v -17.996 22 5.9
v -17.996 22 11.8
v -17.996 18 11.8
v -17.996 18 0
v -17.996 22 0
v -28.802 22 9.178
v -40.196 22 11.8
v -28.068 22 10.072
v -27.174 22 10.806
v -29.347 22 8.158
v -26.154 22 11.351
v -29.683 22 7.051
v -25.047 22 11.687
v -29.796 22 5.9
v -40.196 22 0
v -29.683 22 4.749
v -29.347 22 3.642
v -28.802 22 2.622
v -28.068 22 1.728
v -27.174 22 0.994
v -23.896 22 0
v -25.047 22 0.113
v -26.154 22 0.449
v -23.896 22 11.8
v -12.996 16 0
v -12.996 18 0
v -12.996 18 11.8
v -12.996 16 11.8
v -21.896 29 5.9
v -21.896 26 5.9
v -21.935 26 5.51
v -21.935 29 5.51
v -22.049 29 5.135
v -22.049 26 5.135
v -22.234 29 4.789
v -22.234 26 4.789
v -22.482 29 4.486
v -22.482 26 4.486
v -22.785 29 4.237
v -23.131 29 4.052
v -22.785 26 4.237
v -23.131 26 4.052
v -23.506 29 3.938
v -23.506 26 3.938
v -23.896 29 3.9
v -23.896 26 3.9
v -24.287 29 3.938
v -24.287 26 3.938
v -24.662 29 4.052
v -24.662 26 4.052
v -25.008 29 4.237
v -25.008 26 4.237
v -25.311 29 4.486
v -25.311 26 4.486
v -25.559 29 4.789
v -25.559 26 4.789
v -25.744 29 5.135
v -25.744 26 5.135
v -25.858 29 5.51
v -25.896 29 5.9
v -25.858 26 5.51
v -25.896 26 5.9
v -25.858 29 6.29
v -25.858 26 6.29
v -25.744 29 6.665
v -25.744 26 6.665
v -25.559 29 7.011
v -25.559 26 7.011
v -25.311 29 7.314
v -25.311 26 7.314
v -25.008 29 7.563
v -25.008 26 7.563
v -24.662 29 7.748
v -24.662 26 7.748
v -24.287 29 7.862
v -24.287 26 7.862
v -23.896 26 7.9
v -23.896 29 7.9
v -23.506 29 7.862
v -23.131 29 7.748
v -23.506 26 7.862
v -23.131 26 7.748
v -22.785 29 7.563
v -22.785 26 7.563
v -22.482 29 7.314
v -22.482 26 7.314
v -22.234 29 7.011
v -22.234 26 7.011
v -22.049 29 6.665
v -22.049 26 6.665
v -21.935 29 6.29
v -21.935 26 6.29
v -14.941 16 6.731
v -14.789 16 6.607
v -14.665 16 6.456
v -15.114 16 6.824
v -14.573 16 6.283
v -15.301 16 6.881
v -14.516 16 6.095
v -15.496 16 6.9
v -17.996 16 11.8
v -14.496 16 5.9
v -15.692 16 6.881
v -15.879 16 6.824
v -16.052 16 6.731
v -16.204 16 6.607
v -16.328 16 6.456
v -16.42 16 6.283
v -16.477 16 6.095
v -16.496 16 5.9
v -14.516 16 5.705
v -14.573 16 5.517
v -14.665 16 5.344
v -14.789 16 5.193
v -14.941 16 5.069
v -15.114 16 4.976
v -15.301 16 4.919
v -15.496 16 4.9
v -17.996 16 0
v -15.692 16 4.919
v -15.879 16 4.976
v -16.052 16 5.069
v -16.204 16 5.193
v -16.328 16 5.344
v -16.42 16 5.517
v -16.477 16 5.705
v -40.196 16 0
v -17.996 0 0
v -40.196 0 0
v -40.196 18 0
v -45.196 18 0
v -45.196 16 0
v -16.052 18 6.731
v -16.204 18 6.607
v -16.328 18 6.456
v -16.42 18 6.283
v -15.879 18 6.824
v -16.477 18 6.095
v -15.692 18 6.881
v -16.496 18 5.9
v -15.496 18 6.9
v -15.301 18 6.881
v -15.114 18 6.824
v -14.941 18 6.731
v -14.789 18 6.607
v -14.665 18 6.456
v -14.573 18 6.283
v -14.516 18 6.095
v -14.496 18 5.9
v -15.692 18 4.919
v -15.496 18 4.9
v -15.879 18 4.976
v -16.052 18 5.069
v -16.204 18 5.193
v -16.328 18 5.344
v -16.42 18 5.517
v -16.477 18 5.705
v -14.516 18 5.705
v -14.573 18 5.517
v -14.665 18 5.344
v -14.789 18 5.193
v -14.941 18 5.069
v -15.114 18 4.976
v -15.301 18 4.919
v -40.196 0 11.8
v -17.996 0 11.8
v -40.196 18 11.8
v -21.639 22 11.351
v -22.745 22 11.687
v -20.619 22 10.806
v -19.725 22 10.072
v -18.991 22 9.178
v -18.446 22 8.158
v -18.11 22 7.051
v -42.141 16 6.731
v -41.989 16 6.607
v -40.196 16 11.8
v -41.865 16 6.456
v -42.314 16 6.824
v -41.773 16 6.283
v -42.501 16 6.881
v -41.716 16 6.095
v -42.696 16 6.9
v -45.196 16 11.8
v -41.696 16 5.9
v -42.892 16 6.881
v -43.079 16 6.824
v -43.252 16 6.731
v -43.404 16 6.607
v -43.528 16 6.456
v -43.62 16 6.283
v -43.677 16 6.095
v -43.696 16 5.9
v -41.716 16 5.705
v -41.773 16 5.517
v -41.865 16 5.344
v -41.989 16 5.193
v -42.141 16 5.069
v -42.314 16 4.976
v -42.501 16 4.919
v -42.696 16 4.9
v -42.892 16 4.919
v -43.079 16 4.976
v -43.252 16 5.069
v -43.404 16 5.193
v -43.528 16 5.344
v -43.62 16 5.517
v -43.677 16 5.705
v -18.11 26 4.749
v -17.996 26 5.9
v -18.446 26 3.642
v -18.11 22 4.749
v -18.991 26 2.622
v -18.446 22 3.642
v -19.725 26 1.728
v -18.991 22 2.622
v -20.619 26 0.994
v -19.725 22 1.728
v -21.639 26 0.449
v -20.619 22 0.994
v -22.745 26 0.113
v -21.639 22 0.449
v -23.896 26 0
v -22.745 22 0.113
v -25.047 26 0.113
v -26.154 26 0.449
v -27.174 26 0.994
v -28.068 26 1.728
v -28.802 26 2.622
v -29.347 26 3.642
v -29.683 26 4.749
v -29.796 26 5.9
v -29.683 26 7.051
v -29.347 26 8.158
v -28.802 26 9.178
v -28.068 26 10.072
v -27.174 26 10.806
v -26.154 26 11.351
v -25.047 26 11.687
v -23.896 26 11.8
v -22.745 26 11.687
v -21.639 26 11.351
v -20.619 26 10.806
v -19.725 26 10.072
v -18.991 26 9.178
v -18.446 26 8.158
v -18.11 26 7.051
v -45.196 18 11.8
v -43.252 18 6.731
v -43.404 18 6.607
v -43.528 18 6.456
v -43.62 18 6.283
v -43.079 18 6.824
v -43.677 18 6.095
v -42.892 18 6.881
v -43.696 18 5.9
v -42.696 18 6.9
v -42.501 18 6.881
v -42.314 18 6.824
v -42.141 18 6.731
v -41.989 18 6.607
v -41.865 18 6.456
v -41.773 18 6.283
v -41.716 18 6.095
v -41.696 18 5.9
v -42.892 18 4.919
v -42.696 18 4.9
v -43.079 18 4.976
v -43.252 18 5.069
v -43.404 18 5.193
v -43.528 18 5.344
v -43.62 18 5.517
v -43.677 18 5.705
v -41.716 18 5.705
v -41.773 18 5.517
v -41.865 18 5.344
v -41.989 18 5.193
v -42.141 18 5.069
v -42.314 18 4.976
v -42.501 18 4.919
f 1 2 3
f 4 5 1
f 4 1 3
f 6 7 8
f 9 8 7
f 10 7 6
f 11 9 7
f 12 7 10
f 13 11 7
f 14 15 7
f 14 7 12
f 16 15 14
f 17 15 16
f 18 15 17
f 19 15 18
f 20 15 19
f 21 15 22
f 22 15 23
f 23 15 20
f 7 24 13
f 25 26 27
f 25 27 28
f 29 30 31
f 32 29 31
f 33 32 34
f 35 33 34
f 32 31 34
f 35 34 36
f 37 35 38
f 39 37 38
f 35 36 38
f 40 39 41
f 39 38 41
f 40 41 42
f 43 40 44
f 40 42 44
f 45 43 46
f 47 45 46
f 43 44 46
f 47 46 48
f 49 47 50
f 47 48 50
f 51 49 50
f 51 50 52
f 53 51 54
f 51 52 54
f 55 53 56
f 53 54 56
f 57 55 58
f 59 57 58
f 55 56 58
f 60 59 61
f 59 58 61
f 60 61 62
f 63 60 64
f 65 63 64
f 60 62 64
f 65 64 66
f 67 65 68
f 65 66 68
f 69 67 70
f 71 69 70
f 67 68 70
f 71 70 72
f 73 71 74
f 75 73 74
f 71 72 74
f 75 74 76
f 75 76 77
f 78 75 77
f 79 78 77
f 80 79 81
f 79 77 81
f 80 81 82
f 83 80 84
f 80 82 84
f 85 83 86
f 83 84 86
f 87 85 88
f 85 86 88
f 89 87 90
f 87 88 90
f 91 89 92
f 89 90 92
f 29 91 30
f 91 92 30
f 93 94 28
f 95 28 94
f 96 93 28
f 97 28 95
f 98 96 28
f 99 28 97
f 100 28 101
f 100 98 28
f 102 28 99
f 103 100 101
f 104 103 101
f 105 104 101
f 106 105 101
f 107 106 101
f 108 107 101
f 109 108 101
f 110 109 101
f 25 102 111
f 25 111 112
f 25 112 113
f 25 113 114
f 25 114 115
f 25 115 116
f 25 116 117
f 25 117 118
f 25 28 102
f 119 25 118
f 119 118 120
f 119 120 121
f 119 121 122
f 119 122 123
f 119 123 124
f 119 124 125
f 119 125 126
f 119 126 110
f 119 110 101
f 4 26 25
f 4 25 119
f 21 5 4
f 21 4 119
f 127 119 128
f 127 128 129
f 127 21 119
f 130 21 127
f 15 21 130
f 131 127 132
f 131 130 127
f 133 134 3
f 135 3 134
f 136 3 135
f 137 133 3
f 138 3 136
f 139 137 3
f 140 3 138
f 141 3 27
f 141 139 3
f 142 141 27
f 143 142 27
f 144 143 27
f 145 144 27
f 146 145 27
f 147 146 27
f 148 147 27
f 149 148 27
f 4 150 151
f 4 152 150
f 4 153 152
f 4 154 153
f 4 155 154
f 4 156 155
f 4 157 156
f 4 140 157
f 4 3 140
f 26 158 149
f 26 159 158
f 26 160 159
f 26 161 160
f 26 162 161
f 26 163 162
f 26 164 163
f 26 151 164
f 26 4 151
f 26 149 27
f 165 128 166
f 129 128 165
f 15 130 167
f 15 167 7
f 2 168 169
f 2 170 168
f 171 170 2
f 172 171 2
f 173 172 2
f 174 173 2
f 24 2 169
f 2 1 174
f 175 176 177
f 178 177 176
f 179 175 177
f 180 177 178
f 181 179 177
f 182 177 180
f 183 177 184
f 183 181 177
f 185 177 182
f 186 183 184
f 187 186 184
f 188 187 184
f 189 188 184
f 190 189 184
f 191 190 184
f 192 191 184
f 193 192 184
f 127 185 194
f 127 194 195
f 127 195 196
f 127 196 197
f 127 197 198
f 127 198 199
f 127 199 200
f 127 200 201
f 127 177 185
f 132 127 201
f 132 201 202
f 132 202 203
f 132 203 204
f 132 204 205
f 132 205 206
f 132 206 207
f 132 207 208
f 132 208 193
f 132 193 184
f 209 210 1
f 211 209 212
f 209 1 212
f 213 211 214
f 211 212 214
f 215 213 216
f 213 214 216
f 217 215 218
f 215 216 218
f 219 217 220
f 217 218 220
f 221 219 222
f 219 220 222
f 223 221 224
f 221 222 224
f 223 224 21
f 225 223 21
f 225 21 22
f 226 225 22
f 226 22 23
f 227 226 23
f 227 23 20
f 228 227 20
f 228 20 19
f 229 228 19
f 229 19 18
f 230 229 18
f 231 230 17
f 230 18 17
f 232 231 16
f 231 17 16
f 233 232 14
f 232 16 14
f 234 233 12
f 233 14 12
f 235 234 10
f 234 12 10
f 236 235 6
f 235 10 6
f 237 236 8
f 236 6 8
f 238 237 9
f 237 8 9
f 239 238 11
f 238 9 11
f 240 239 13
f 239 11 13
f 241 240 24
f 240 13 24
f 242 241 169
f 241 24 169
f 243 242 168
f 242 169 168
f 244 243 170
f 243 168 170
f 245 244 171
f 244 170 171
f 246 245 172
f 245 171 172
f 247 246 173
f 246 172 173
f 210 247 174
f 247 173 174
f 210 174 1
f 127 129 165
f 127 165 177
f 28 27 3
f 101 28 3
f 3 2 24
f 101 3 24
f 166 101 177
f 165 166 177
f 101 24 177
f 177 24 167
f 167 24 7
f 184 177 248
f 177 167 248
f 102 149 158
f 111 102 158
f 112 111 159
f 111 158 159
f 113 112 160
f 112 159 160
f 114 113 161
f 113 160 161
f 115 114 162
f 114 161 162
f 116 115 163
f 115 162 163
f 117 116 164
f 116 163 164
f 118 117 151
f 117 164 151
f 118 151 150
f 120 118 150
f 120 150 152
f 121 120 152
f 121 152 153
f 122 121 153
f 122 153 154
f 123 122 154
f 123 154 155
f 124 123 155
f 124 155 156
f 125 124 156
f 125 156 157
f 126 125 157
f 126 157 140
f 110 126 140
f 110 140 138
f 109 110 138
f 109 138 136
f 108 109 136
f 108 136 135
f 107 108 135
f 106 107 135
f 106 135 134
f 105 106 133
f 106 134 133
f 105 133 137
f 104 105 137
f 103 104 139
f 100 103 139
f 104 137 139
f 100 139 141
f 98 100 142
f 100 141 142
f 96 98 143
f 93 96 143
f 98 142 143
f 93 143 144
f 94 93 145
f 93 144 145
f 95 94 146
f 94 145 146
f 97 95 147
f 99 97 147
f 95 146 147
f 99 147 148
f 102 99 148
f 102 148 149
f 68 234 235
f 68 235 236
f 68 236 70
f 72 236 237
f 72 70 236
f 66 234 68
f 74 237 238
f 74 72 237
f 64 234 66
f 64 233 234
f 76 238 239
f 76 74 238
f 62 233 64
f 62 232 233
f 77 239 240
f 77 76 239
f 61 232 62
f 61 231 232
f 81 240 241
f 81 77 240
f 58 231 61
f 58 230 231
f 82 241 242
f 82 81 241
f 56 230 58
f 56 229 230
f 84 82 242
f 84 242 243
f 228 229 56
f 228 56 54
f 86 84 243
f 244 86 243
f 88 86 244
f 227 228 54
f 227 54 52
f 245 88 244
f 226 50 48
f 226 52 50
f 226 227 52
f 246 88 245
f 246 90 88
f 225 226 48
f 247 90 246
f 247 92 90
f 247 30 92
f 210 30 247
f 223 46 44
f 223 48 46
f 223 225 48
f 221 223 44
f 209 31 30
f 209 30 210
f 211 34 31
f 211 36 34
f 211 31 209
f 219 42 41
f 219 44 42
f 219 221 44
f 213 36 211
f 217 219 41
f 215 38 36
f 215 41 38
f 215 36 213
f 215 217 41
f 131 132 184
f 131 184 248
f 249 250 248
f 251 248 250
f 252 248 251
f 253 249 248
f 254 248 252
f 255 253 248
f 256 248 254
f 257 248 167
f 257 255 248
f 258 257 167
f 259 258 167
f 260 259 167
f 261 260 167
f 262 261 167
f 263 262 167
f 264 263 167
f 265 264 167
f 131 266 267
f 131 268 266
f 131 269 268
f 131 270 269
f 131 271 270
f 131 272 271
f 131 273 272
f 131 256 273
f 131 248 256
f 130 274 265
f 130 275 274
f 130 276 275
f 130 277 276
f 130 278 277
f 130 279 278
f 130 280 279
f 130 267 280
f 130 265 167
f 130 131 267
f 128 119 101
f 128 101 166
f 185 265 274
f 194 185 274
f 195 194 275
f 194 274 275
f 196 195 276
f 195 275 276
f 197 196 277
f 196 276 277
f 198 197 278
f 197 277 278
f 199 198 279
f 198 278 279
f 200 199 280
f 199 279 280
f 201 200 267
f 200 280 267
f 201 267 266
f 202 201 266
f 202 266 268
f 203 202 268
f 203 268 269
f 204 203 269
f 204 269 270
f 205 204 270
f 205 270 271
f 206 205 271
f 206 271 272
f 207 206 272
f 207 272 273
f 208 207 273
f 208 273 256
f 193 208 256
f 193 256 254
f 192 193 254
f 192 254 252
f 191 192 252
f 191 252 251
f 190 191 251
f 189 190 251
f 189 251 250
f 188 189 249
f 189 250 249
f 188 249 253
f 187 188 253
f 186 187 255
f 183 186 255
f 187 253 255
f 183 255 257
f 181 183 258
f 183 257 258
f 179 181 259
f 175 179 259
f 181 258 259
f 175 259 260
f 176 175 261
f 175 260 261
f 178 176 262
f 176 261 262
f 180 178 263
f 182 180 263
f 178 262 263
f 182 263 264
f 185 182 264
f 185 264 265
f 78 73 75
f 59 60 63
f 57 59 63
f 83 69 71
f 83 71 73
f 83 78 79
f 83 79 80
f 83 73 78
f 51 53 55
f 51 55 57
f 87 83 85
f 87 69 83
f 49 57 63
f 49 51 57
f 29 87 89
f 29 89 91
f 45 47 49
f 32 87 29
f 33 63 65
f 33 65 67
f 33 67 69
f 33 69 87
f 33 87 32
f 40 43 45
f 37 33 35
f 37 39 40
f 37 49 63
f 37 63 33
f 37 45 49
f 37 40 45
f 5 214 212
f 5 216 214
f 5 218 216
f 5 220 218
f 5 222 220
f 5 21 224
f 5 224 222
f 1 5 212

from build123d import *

# Parameters (mm, degrees)
BOSS_EXTRU_1_DEPTH      = 11.8
ESQUISSE2_R             = 1
ENL_V_MAT_EXTRU_1_DEPTH = 11.8
ESQUISSE3_R             = 5.9
BOSS_EXTRU_2_DEPTH      = 4
ESQUISSE4_R             = 2
BOSS_EXTRU_3_DEPTH      = 3
ESQUISSE5_W             = 5
ESQUISSE5_H             = 4
BOSS_EXTRU_4_DEPTH      = 3
ESQUISSE6_W             = 3
ESQUISSE6_H             = 5
ENL_V_MAT_EXTRU_2_DEPTH = 10


with BuildPart() as part:
    # Esquisse1 → Boss.-Extru.1 (new body)
    with BuildSketch(Plane.XY):
        Polygon((-45.196459949, 18), (-40.196459949, 18), (-40.196459949, 22), (-17.996459949, 22), (-17.996459949, 18), (-12.996459949, 18), (-12.996459949, 16), (-17.996459949, 16), (-17.996459949, 0), (-40.196459949, 0), (-40.196459949, 16), (-45.196459949, 16), align=None)
    extrude(amount=BOSS_EXTRU_1_DEPTH)

    # Esquisse2 → Enlèv. mat.-Extru.1 (cut)
    with BuildSketch(Plane(origin=(0, 18, 0), x_dir=(1, 0, 0), z_dir=(0, 1, 0))):
        with Locations((-42.696459949, -5.9)):
            Circle(ESQUISSE2_R)
        with Locations((-15.496459949, -5.9)):
            Circle(ESQUISSE2_R)
    extrude(amount=-ENL_V_MAT_EXTRU_1_DEPTH, mode=Mode.SUBTRACT)

    # Esquisse3 → Boss.-Extru.2 (add)
    with BuildSketch(Plane(origin=(0, 22, 0), x_dir=(1, 0, 0), z_dir=(0, 1, 0))):
        with Locations((-23.896459949, -5.9)):
            Circle(ESQUISSE3_R)
    extrude(amount=BOSS_EXTRU_2_DEPTH)

    # Esquisse4 → Boss.-Extru.3 (add)
    with BuildSketch(Plane(origin=(0, 26, 0), x_dir=(1, 0, 0), z_dir=(0, 1, 0))):
        with Locations((-23.896459949, -5.9)):
            Circle(ESQUISSE4_R)
    extrude(amount=BOSS_EXTRU_3_DEPTH)

    # Esquisse5 → Boss.-Extru.4 (add)
    with BuildSketch(Plane(origin=(-17.996459949, 0, 0), x_dir=(0, 0, -1), z_dir=(1, 0, 0))):
        with Locations((-5.8, 5)):
            Rectangle(ESQUISSE5_W, ESQUISSE5_H)
    extrude(amount=BOSS_EXTRU_4_DEPTH)

    # Esquisse6 → Enlèv. mat.-Extru.2 (cut)
    with BuildSketch(Plane(origin=(0, 7, 0), x_dir=(1, 0, 0), z_dir=(0, 1, 0))):
        with Locations((-16.496459949, -5.8)):
            Rectangle(ESQUISSE6_W, ESQUISSE6_H)
    extrude(amount=-ENL_V_MAT_EXTRU_2_DEPTH, mode=Mode.SUBTRACT)


solid = part.part
